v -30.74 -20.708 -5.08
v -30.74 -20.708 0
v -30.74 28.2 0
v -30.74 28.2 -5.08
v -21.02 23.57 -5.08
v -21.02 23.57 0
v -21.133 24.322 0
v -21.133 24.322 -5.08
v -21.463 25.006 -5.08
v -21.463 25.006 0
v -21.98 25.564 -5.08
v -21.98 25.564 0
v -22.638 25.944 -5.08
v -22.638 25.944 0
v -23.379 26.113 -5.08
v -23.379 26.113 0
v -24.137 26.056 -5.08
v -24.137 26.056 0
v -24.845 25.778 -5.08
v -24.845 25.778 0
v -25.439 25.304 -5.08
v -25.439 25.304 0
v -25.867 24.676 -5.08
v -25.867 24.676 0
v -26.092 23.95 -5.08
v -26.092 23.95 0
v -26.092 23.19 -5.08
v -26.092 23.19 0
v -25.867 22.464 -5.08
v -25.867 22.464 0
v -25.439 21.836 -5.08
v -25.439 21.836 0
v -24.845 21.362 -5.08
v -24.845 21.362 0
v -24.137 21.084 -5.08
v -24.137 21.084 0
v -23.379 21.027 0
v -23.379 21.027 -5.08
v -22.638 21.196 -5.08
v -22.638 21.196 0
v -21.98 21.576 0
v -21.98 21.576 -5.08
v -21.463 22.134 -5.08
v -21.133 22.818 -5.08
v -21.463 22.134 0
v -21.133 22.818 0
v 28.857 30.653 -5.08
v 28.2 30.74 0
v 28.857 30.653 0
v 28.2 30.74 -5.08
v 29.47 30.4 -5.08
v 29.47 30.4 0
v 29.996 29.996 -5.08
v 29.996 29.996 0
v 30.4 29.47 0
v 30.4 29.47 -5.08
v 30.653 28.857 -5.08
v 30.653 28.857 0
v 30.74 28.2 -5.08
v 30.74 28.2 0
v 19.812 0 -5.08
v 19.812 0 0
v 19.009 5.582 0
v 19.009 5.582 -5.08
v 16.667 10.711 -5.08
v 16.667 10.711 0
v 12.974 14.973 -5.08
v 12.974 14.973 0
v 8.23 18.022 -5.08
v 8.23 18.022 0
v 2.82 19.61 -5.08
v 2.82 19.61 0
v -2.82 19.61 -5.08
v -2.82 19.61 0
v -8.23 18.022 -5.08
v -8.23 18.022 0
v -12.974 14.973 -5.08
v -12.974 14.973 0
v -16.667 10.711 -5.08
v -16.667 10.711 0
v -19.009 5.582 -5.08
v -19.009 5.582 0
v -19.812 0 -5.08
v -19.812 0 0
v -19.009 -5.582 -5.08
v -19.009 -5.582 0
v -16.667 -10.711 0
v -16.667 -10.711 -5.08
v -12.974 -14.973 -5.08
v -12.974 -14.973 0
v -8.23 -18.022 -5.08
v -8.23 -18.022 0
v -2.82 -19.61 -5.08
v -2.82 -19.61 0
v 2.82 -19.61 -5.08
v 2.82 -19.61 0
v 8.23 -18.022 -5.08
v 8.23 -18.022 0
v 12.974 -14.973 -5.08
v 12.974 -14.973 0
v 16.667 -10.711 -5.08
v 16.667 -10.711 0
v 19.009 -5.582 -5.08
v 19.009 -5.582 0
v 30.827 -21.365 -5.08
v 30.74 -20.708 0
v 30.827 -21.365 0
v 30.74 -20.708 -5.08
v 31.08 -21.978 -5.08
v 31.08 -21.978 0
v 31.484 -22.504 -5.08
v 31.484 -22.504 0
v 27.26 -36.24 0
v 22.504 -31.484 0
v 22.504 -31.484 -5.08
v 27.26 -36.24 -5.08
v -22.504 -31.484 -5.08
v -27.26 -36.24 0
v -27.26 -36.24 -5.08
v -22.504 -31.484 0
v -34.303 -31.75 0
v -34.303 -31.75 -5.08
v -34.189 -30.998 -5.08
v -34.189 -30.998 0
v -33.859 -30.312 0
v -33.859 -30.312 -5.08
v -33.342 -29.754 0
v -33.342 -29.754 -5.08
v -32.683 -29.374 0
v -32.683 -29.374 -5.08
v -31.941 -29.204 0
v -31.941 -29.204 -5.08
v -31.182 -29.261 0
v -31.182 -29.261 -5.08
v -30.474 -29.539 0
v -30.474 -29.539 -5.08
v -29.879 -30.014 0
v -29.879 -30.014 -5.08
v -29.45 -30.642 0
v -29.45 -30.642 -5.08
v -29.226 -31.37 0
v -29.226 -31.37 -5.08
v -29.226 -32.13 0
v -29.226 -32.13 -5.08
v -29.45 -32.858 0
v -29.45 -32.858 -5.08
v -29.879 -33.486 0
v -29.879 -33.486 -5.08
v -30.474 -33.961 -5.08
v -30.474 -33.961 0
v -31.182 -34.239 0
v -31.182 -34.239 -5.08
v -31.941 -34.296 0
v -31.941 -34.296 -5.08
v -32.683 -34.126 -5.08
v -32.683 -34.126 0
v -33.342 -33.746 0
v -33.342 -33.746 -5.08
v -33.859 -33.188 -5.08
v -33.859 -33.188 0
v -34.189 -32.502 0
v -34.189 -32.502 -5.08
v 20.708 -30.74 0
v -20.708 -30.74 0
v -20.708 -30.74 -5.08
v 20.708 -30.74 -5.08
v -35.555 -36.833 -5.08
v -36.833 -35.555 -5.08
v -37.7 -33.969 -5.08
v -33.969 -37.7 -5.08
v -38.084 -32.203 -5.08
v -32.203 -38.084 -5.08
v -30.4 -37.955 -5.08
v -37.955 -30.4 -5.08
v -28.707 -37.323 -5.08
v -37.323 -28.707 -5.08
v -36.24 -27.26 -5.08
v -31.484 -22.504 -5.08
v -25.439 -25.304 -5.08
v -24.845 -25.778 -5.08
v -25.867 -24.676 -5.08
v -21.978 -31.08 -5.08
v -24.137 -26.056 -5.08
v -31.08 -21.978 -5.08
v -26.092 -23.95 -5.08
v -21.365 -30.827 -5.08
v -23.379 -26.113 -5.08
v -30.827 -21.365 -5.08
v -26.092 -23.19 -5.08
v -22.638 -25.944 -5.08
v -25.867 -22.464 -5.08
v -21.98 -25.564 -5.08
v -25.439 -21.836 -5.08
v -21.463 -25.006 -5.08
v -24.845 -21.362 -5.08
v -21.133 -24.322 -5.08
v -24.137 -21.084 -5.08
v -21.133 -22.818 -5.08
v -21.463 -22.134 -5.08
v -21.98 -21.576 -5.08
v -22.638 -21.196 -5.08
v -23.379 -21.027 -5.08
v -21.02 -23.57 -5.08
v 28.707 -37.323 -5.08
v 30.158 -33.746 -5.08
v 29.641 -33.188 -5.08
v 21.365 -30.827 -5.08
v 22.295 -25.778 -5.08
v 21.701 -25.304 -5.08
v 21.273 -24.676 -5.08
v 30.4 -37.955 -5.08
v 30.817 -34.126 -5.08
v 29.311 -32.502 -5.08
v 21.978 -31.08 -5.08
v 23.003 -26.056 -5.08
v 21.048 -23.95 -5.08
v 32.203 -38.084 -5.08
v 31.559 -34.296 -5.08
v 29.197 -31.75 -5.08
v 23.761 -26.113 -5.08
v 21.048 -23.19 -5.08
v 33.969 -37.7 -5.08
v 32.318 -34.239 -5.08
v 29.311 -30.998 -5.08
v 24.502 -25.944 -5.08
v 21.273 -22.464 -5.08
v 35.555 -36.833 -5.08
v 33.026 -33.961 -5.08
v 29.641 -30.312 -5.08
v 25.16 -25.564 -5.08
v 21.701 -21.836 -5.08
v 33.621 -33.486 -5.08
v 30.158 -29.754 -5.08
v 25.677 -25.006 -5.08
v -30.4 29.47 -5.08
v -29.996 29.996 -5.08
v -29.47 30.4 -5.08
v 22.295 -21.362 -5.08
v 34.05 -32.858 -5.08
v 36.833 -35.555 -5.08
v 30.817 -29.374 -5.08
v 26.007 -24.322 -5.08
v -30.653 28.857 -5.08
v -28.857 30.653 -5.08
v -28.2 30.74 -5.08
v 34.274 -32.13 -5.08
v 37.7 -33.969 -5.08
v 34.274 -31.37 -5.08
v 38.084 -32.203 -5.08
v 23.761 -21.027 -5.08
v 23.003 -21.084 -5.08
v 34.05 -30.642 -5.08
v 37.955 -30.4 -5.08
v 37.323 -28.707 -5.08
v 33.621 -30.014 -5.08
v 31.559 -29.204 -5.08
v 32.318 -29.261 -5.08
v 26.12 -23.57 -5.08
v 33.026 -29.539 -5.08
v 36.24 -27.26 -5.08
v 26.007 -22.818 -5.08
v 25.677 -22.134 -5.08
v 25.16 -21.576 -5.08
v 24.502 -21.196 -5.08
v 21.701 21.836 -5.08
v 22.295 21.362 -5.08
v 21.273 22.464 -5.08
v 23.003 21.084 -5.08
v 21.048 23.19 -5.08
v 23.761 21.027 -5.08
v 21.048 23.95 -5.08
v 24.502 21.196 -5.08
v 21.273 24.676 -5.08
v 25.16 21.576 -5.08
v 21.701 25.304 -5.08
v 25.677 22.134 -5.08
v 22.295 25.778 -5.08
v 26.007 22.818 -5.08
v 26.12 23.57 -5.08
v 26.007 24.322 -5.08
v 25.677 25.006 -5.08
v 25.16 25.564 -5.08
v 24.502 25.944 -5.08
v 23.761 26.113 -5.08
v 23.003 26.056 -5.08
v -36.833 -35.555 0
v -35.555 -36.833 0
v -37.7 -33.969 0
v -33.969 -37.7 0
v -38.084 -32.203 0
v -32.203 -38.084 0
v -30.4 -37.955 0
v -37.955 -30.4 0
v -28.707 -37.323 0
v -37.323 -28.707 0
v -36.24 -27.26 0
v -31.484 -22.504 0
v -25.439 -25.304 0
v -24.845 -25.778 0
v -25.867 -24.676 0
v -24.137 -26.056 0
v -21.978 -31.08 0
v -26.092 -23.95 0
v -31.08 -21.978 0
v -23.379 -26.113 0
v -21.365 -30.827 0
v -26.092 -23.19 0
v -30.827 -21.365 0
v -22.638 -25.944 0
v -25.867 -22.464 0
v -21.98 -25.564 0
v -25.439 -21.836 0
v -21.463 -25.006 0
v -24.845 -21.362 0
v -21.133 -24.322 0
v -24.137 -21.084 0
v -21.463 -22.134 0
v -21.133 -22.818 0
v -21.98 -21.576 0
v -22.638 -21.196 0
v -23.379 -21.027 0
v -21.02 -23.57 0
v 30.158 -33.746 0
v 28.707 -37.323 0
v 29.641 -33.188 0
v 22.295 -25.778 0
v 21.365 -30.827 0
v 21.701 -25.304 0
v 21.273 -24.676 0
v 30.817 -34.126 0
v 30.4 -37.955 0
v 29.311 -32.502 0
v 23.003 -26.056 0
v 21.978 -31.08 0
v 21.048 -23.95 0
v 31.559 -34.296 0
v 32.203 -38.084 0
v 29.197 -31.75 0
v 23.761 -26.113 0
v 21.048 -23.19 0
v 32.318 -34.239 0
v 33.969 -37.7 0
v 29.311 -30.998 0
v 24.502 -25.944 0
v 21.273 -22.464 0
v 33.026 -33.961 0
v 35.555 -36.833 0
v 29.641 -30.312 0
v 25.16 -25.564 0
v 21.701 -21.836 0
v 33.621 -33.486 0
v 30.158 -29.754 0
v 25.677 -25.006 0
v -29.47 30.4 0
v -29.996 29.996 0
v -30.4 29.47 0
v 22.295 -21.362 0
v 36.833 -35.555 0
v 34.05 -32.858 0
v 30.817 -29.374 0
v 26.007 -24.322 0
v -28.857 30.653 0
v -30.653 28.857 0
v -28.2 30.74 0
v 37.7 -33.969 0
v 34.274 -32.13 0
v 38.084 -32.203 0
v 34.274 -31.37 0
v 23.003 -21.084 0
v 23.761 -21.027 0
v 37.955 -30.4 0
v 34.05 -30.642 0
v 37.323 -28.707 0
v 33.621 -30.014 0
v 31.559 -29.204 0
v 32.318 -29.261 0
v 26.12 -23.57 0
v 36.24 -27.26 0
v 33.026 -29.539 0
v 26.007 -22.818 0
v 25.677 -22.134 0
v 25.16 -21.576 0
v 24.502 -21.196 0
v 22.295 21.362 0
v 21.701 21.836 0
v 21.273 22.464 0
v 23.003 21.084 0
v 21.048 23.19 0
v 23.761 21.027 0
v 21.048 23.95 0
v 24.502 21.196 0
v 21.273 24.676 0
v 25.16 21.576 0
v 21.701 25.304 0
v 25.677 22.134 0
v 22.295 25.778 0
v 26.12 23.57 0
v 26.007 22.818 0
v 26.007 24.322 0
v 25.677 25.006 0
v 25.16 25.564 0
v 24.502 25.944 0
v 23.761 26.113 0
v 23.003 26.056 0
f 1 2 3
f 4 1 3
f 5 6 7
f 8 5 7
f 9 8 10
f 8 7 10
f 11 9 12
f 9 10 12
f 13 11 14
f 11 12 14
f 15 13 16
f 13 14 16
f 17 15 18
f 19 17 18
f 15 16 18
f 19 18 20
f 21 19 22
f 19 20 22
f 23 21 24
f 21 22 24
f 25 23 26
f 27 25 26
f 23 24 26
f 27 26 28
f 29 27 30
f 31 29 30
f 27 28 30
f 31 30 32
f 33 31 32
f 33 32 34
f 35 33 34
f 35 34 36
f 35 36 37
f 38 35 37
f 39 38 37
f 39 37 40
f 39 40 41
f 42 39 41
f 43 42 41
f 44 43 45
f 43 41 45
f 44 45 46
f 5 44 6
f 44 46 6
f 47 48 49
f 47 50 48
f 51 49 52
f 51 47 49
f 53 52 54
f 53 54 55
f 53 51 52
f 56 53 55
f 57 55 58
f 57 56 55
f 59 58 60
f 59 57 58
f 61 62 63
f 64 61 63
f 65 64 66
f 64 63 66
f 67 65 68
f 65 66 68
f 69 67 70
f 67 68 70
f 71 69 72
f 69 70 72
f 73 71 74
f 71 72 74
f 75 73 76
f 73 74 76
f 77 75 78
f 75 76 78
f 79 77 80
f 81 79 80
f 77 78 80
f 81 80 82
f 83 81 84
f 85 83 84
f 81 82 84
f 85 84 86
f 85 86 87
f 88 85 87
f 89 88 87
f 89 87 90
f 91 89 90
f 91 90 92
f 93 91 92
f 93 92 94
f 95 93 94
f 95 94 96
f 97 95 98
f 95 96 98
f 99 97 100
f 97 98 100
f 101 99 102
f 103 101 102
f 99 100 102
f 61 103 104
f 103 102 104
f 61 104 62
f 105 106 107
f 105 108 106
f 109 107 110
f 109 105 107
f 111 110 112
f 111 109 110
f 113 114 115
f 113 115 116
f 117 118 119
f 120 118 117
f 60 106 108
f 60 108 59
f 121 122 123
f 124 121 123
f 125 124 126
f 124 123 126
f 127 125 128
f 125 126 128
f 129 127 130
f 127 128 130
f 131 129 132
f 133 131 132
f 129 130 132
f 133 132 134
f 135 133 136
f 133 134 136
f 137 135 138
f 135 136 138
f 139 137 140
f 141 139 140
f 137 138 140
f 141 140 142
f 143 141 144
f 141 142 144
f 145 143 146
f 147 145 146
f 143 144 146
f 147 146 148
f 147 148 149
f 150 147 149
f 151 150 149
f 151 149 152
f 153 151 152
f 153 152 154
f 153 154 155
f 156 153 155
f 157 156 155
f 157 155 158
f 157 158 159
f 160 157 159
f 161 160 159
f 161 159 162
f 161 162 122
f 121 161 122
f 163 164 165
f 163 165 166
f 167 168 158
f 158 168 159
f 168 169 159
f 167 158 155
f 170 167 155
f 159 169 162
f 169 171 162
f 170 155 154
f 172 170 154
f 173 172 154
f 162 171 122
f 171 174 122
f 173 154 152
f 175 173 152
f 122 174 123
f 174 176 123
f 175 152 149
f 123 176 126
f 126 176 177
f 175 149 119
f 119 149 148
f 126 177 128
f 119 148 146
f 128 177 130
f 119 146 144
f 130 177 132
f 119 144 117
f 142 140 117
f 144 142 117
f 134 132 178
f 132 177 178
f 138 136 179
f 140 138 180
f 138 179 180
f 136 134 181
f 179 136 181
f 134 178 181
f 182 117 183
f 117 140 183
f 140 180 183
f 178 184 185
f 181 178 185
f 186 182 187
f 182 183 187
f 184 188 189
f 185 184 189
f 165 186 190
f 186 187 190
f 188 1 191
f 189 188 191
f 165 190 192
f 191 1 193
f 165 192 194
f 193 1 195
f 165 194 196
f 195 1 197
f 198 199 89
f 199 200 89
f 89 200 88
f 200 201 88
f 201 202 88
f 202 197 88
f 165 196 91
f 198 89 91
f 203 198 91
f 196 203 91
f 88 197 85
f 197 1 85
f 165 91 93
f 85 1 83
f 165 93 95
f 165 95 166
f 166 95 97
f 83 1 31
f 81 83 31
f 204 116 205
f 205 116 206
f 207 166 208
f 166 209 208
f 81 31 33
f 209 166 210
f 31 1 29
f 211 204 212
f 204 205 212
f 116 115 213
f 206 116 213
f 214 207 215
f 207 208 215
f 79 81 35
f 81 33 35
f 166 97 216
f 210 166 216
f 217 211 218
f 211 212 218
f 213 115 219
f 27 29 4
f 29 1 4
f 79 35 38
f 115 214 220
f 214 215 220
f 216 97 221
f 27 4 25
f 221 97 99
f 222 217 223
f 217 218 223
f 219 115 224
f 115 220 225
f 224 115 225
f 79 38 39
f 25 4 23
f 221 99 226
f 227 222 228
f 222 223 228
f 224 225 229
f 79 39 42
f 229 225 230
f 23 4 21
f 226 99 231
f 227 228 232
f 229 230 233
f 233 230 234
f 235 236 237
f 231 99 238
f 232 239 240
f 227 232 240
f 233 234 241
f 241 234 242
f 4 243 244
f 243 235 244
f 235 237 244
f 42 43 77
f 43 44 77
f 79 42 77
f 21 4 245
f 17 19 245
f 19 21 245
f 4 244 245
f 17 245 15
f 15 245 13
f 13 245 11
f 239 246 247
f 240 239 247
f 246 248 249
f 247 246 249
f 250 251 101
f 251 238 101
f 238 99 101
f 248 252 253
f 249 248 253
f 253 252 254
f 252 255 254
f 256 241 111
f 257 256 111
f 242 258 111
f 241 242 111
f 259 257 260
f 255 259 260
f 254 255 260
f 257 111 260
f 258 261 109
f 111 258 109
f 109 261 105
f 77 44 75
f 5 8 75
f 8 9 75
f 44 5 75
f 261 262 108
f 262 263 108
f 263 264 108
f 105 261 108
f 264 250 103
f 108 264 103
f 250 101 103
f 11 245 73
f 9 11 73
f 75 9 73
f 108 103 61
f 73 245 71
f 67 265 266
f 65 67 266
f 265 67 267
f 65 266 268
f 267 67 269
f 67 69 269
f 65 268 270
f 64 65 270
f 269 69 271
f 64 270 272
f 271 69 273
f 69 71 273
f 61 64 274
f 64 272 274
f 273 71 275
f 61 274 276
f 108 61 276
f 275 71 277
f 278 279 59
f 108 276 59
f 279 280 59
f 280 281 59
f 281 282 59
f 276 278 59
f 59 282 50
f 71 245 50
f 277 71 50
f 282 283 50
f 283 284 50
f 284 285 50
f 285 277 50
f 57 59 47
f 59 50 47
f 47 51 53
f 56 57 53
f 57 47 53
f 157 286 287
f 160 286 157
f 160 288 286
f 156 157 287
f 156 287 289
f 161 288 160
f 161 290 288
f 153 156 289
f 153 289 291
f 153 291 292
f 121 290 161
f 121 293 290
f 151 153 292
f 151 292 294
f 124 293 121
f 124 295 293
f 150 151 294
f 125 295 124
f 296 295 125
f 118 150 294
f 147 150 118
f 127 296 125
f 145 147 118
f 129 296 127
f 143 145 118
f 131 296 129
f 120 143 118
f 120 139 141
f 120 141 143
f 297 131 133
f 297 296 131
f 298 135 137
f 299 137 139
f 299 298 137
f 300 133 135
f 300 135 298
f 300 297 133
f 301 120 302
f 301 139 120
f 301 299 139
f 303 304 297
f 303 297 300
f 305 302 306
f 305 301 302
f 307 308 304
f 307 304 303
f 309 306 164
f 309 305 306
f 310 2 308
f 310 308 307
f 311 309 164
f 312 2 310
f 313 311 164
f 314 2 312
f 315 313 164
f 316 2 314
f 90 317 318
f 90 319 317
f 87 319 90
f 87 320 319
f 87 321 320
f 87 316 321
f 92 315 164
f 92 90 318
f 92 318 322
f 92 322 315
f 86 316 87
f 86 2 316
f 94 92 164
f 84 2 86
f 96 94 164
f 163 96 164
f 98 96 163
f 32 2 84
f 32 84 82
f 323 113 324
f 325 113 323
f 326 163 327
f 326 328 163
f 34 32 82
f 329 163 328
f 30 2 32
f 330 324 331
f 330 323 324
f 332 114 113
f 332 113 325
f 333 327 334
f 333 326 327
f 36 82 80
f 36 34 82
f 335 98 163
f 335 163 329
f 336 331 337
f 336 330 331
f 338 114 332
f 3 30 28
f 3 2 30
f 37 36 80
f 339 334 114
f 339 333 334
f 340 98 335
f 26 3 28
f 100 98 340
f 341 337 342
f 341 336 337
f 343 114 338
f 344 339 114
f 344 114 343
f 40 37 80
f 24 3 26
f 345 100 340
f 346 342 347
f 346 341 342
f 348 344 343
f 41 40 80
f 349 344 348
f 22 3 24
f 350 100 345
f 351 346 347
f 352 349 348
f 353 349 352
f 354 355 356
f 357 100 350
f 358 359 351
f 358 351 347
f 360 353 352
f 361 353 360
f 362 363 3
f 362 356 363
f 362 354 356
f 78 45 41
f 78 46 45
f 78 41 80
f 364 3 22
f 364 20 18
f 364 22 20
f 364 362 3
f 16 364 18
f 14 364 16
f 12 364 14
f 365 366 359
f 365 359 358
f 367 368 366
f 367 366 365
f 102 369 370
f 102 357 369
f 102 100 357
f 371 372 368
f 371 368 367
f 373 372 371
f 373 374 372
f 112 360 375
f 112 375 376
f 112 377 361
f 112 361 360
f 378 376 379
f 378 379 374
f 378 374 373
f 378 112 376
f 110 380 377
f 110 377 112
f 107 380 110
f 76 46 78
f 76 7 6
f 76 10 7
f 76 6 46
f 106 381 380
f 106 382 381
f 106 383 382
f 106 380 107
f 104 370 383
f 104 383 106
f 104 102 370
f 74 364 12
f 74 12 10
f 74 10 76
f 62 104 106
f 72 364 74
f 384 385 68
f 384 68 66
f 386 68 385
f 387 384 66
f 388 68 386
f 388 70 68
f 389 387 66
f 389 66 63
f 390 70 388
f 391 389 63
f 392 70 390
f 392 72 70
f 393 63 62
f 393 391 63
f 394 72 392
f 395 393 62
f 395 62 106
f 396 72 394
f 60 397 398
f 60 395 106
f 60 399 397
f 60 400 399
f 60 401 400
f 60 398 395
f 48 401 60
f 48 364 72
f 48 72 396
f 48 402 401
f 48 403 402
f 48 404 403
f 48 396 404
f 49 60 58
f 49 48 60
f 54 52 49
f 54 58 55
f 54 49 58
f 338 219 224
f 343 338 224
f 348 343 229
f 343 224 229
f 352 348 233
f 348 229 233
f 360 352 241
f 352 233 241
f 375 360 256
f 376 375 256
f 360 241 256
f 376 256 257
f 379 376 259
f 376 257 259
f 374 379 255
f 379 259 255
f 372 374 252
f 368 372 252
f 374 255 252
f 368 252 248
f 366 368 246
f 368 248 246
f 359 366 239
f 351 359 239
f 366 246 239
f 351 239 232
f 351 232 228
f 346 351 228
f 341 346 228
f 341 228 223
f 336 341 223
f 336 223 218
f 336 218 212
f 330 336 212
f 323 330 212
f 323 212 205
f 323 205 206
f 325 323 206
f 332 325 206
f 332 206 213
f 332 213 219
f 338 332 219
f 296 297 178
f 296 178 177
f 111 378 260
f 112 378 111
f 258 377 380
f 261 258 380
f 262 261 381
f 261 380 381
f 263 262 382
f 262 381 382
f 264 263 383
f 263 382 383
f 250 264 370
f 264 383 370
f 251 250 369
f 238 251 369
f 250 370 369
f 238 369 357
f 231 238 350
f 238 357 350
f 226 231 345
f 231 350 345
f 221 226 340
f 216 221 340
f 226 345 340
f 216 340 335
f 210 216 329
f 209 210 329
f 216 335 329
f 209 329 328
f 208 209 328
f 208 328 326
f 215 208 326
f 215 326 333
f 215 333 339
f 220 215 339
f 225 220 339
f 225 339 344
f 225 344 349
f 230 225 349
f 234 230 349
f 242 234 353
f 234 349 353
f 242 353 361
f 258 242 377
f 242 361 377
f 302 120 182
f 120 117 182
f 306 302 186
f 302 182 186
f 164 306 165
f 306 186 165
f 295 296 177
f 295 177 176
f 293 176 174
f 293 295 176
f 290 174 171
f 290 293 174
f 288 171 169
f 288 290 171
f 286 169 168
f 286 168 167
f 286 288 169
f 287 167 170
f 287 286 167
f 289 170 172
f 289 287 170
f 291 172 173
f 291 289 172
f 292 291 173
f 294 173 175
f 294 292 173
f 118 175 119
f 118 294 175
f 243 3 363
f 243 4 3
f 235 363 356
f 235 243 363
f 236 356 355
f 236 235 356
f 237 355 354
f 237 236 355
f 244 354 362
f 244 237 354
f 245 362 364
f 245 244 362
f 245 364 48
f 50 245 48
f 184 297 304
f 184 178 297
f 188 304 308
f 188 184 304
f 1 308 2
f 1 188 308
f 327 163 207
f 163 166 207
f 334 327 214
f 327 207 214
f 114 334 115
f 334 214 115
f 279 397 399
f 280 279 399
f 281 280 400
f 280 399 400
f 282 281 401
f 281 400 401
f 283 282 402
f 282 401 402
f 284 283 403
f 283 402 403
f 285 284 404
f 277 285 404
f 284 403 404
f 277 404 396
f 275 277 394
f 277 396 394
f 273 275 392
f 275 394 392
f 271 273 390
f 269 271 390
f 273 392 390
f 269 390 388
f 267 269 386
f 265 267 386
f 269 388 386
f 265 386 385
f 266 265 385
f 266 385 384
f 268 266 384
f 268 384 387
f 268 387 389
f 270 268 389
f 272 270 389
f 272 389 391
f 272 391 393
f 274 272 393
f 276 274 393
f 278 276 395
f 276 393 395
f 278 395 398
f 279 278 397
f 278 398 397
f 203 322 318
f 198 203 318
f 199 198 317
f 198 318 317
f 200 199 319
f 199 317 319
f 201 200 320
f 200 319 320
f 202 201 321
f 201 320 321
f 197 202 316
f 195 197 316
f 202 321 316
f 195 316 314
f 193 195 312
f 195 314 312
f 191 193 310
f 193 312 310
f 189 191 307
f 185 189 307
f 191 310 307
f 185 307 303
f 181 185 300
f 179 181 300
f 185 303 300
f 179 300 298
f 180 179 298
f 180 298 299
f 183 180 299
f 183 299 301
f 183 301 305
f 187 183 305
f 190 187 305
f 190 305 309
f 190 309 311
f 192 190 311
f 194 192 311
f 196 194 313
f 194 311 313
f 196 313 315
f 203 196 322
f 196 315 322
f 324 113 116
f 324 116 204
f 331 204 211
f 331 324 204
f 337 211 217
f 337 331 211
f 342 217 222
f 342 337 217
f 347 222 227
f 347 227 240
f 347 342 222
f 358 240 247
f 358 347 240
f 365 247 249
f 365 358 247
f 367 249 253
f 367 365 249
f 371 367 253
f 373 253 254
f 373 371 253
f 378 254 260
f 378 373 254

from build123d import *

# Parameters (mm, degrees)
SKETCH1_W              = 61.48
SKETCH1_H              = 61.48
SKETCH1_R              = 2.55
SKETCH1_R_2            = 19.812
BOSS_EXTRUDE1_DEPTH    = 5.08
FILLET1_R              = 2.54
BOSS_EXTRUDE2_DEPTH    = 5.08
FILLET2_R              = 2.54
F_10_CLEARANCE_HOLE1_D = 5.1054


with BuildPart() as part:
    # Sketch1 → Boss-Extrude1 (new body)
    with BuildSketch(Plane.XY):
        Rectangle(SKETCH1_W, SKETCH1_H)
        with Locations((-23.570000148, 23.570000149)):
            Circle(SKETCH1_R, mode=Mode.SUBTRACT)
        with Locations((23.569999852, 23.570000149)):
            Circle(SKETCH1_R, mode=Mode.SUBTRACT)
        with Locations((23.569999852, -23.569999851)):
            Circle(SKETCH1_R, mode=Mode.SUBTRACT)
        with Locations((-23.570000148, -23.569999851)):
            Circle(SKETCH1_R, mode=Mode.SUBTRACT)
        with Locations((-1.48e-07, 1.49e-07)):
            Circle(SKETCH1_R_2, mode=Mode.SUBTRACT)
    extrude(amount=-BOSS_EXTRUDE1_DEPTH)

    # Fillet1
    fillet1_edges = [part.edges().sort_by_distance(p)[0] for p in [
        (-30.74, 30.74, -2.54),
        (30.74, 30.74, -2.54),
        (30.74, -30.74, -2.54),
        (-30.74, -30.74, -2.54),
    ]]
    fillet(fillet1_edges, radius=FILLET1_R)

    # Sketch7 → Boss-Extrude2 (add, through all)
    with BuildSketch(Plane.XY):
        with BuildLine():
            Line((-27.259871939, -36.240128061), (-21.759743879, -30.74))
            Line((-21.759743879, -30.74), (-30.74, -21.759743879))
            Line((-30.74, -21.759743879), (-36.240128061, -27.259871939))
            ThreePointArc((-36.240128061, -27.259871939), (-36.240128061, -36.240128061), (-27.259871939, -36.240128061))
        make_face()
        with BuildLine():
            Line((30.74, -21.759743879), (21.759743879, -30.74))
            Line((21.759743879, -30.74), (27.259871939, -36.240128061))
            ThreePointArc((27.259871939, -36.240128061), (36.240128061, -36.240128061), (36.240128061, -27.259871939))
            Line((36.240128061, -27.259871939), (30.74, -21.759743879))
        make_face()
    extrude(amount=-BOSS_EXTRUDE2_DEPTH)

    # Fillet2
    fillet2_edges = [part.edges().sort_by_distance(p)[0] for p in [
        (-30.74, -21.759743879, -2.54),
        (-21.759743879, -30.74, -2.54),
        (21.759743879, -30.74, -2.54),
        (30.74, -21.759743879, -2.54),
    ]]
    fillet(fillet2_edges, radius=FILLET2_R)

    # #10 Clearance Hole1 (through all)
    with Locations(Plane.XY):
        with Locations((-31.75, -31.75), (31.75, -31.75)):
            Hole(F_10_CLEARANCE_HOLE1_D / 2)


solid = part.part
